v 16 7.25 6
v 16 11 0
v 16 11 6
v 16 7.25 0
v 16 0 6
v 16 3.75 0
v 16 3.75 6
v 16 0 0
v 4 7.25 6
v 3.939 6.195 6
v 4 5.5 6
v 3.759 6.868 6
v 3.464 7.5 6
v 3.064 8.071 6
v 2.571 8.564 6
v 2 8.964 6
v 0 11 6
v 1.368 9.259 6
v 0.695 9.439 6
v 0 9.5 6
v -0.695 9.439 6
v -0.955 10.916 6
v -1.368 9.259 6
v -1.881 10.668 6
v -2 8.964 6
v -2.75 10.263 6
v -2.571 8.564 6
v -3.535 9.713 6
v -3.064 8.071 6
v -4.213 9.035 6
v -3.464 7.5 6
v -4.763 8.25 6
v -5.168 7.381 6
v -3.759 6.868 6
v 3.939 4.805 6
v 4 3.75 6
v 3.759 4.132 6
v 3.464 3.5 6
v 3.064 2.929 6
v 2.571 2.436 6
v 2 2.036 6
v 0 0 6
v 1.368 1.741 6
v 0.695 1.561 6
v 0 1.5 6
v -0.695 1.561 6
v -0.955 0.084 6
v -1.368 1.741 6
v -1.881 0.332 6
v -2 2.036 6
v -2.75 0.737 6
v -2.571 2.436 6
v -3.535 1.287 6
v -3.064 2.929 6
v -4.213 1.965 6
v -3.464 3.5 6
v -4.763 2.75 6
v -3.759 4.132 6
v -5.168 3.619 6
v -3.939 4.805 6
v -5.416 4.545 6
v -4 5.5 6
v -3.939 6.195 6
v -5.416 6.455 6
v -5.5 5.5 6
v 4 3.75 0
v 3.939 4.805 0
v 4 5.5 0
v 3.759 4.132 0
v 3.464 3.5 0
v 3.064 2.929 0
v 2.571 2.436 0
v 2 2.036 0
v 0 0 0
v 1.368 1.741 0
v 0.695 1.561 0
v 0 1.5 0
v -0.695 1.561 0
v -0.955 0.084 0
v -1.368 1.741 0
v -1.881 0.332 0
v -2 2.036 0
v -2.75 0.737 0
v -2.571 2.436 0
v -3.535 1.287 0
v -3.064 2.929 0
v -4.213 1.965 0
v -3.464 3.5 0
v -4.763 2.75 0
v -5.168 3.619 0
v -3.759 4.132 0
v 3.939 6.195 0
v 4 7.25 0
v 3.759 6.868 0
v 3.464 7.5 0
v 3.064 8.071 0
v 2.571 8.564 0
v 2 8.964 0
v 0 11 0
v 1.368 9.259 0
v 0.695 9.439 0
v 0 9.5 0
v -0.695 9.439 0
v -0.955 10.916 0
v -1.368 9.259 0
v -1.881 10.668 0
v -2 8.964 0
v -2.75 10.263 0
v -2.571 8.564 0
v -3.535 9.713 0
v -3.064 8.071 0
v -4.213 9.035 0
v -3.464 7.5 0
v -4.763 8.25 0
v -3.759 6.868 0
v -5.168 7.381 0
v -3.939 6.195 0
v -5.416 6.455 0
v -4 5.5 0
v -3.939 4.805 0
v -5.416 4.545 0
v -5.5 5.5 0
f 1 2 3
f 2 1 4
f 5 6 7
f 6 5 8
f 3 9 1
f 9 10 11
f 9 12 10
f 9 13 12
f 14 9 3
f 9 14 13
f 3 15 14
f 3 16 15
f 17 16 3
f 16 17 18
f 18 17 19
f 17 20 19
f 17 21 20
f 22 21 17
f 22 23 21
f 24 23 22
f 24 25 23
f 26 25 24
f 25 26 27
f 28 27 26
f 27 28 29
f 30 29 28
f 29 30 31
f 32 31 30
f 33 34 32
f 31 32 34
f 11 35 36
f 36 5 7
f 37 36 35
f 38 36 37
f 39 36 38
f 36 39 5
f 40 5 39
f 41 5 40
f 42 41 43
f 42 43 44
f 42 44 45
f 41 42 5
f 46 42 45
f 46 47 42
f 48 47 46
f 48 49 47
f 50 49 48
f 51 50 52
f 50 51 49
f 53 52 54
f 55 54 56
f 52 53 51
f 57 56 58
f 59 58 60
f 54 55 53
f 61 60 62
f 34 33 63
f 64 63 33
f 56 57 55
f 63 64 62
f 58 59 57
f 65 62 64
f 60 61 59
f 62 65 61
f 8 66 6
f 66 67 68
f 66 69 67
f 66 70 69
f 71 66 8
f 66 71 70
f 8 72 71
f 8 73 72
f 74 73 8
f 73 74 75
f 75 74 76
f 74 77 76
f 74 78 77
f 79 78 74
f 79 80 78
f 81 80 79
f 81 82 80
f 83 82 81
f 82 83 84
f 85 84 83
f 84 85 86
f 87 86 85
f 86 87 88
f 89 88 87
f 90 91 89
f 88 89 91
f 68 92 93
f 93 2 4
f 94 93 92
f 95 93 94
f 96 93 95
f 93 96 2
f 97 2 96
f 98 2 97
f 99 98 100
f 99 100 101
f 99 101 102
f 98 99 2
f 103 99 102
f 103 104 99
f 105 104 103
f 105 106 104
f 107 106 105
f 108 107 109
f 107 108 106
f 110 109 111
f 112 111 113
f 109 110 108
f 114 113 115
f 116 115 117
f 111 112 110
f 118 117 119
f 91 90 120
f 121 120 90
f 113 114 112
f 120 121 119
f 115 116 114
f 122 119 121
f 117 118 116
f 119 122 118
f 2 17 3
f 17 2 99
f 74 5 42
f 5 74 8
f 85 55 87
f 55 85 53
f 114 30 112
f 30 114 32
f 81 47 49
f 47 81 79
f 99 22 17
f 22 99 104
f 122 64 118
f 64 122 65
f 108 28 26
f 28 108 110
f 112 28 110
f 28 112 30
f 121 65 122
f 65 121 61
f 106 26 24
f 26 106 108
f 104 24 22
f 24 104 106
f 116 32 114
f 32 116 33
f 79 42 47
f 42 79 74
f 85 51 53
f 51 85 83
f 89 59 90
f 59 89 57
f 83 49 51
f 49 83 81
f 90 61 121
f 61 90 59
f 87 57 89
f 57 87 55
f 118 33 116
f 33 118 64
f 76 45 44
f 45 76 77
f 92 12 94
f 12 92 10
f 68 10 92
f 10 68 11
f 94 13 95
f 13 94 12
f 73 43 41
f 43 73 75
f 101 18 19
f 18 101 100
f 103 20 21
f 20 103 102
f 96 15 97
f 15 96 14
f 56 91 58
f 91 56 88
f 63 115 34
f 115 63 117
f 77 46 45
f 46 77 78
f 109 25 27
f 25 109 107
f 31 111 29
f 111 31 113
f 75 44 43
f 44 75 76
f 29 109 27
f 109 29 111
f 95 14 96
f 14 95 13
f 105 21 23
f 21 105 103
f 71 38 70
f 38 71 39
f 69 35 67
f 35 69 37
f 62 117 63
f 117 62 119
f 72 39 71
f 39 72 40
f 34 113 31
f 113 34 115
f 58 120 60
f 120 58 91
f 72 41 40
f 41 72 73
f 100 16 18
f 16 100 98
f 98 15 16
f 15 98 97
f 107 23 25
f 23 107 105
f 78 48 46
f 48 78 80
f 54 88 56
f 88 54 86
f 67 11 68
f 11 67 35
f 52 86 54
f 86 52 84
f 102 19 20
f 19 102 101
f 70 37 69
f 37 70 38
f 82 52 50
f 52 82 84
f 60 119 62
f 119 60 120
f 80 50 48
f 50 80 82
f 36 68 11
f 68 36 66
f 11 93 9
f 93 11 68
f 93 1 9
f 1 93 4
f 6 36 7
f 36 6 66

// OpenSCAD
$fn = 36;


_rayontube = 4;
_decaltube = 0;
_epaistube = 1.5;

_epaisplanche = 3.5;
_decalplanche = 0;
_longuplanche = 12;

_largeur = 6;



_epaisseur = (_rayontube+_epaistube)*2;
_longueur = _longuplanche + _decalplanche;

difference() {

// l'enveloppe globale

union() {

	cube([_longueur+_rayontube-_decaltube,_epaisseur,_largeur], center=false);

	translate ([0,_epaisseur/2,0]) {
		cylinder(h=_largeur, r=_epaisseur/2);
	}

}

// la partie à enlever

translate([-_decaltube,_epaisseur/2,-5]) {
	cylinder(h=_largeur+10, r=_rayontube);
}

translate([(_decalplanche-_decaltube+_rayontube),(_epaisseur-_epaisplanche)/2,-5]) {
	cube([_longueur, _epaisplanche, _largeur+10]);
}


}
